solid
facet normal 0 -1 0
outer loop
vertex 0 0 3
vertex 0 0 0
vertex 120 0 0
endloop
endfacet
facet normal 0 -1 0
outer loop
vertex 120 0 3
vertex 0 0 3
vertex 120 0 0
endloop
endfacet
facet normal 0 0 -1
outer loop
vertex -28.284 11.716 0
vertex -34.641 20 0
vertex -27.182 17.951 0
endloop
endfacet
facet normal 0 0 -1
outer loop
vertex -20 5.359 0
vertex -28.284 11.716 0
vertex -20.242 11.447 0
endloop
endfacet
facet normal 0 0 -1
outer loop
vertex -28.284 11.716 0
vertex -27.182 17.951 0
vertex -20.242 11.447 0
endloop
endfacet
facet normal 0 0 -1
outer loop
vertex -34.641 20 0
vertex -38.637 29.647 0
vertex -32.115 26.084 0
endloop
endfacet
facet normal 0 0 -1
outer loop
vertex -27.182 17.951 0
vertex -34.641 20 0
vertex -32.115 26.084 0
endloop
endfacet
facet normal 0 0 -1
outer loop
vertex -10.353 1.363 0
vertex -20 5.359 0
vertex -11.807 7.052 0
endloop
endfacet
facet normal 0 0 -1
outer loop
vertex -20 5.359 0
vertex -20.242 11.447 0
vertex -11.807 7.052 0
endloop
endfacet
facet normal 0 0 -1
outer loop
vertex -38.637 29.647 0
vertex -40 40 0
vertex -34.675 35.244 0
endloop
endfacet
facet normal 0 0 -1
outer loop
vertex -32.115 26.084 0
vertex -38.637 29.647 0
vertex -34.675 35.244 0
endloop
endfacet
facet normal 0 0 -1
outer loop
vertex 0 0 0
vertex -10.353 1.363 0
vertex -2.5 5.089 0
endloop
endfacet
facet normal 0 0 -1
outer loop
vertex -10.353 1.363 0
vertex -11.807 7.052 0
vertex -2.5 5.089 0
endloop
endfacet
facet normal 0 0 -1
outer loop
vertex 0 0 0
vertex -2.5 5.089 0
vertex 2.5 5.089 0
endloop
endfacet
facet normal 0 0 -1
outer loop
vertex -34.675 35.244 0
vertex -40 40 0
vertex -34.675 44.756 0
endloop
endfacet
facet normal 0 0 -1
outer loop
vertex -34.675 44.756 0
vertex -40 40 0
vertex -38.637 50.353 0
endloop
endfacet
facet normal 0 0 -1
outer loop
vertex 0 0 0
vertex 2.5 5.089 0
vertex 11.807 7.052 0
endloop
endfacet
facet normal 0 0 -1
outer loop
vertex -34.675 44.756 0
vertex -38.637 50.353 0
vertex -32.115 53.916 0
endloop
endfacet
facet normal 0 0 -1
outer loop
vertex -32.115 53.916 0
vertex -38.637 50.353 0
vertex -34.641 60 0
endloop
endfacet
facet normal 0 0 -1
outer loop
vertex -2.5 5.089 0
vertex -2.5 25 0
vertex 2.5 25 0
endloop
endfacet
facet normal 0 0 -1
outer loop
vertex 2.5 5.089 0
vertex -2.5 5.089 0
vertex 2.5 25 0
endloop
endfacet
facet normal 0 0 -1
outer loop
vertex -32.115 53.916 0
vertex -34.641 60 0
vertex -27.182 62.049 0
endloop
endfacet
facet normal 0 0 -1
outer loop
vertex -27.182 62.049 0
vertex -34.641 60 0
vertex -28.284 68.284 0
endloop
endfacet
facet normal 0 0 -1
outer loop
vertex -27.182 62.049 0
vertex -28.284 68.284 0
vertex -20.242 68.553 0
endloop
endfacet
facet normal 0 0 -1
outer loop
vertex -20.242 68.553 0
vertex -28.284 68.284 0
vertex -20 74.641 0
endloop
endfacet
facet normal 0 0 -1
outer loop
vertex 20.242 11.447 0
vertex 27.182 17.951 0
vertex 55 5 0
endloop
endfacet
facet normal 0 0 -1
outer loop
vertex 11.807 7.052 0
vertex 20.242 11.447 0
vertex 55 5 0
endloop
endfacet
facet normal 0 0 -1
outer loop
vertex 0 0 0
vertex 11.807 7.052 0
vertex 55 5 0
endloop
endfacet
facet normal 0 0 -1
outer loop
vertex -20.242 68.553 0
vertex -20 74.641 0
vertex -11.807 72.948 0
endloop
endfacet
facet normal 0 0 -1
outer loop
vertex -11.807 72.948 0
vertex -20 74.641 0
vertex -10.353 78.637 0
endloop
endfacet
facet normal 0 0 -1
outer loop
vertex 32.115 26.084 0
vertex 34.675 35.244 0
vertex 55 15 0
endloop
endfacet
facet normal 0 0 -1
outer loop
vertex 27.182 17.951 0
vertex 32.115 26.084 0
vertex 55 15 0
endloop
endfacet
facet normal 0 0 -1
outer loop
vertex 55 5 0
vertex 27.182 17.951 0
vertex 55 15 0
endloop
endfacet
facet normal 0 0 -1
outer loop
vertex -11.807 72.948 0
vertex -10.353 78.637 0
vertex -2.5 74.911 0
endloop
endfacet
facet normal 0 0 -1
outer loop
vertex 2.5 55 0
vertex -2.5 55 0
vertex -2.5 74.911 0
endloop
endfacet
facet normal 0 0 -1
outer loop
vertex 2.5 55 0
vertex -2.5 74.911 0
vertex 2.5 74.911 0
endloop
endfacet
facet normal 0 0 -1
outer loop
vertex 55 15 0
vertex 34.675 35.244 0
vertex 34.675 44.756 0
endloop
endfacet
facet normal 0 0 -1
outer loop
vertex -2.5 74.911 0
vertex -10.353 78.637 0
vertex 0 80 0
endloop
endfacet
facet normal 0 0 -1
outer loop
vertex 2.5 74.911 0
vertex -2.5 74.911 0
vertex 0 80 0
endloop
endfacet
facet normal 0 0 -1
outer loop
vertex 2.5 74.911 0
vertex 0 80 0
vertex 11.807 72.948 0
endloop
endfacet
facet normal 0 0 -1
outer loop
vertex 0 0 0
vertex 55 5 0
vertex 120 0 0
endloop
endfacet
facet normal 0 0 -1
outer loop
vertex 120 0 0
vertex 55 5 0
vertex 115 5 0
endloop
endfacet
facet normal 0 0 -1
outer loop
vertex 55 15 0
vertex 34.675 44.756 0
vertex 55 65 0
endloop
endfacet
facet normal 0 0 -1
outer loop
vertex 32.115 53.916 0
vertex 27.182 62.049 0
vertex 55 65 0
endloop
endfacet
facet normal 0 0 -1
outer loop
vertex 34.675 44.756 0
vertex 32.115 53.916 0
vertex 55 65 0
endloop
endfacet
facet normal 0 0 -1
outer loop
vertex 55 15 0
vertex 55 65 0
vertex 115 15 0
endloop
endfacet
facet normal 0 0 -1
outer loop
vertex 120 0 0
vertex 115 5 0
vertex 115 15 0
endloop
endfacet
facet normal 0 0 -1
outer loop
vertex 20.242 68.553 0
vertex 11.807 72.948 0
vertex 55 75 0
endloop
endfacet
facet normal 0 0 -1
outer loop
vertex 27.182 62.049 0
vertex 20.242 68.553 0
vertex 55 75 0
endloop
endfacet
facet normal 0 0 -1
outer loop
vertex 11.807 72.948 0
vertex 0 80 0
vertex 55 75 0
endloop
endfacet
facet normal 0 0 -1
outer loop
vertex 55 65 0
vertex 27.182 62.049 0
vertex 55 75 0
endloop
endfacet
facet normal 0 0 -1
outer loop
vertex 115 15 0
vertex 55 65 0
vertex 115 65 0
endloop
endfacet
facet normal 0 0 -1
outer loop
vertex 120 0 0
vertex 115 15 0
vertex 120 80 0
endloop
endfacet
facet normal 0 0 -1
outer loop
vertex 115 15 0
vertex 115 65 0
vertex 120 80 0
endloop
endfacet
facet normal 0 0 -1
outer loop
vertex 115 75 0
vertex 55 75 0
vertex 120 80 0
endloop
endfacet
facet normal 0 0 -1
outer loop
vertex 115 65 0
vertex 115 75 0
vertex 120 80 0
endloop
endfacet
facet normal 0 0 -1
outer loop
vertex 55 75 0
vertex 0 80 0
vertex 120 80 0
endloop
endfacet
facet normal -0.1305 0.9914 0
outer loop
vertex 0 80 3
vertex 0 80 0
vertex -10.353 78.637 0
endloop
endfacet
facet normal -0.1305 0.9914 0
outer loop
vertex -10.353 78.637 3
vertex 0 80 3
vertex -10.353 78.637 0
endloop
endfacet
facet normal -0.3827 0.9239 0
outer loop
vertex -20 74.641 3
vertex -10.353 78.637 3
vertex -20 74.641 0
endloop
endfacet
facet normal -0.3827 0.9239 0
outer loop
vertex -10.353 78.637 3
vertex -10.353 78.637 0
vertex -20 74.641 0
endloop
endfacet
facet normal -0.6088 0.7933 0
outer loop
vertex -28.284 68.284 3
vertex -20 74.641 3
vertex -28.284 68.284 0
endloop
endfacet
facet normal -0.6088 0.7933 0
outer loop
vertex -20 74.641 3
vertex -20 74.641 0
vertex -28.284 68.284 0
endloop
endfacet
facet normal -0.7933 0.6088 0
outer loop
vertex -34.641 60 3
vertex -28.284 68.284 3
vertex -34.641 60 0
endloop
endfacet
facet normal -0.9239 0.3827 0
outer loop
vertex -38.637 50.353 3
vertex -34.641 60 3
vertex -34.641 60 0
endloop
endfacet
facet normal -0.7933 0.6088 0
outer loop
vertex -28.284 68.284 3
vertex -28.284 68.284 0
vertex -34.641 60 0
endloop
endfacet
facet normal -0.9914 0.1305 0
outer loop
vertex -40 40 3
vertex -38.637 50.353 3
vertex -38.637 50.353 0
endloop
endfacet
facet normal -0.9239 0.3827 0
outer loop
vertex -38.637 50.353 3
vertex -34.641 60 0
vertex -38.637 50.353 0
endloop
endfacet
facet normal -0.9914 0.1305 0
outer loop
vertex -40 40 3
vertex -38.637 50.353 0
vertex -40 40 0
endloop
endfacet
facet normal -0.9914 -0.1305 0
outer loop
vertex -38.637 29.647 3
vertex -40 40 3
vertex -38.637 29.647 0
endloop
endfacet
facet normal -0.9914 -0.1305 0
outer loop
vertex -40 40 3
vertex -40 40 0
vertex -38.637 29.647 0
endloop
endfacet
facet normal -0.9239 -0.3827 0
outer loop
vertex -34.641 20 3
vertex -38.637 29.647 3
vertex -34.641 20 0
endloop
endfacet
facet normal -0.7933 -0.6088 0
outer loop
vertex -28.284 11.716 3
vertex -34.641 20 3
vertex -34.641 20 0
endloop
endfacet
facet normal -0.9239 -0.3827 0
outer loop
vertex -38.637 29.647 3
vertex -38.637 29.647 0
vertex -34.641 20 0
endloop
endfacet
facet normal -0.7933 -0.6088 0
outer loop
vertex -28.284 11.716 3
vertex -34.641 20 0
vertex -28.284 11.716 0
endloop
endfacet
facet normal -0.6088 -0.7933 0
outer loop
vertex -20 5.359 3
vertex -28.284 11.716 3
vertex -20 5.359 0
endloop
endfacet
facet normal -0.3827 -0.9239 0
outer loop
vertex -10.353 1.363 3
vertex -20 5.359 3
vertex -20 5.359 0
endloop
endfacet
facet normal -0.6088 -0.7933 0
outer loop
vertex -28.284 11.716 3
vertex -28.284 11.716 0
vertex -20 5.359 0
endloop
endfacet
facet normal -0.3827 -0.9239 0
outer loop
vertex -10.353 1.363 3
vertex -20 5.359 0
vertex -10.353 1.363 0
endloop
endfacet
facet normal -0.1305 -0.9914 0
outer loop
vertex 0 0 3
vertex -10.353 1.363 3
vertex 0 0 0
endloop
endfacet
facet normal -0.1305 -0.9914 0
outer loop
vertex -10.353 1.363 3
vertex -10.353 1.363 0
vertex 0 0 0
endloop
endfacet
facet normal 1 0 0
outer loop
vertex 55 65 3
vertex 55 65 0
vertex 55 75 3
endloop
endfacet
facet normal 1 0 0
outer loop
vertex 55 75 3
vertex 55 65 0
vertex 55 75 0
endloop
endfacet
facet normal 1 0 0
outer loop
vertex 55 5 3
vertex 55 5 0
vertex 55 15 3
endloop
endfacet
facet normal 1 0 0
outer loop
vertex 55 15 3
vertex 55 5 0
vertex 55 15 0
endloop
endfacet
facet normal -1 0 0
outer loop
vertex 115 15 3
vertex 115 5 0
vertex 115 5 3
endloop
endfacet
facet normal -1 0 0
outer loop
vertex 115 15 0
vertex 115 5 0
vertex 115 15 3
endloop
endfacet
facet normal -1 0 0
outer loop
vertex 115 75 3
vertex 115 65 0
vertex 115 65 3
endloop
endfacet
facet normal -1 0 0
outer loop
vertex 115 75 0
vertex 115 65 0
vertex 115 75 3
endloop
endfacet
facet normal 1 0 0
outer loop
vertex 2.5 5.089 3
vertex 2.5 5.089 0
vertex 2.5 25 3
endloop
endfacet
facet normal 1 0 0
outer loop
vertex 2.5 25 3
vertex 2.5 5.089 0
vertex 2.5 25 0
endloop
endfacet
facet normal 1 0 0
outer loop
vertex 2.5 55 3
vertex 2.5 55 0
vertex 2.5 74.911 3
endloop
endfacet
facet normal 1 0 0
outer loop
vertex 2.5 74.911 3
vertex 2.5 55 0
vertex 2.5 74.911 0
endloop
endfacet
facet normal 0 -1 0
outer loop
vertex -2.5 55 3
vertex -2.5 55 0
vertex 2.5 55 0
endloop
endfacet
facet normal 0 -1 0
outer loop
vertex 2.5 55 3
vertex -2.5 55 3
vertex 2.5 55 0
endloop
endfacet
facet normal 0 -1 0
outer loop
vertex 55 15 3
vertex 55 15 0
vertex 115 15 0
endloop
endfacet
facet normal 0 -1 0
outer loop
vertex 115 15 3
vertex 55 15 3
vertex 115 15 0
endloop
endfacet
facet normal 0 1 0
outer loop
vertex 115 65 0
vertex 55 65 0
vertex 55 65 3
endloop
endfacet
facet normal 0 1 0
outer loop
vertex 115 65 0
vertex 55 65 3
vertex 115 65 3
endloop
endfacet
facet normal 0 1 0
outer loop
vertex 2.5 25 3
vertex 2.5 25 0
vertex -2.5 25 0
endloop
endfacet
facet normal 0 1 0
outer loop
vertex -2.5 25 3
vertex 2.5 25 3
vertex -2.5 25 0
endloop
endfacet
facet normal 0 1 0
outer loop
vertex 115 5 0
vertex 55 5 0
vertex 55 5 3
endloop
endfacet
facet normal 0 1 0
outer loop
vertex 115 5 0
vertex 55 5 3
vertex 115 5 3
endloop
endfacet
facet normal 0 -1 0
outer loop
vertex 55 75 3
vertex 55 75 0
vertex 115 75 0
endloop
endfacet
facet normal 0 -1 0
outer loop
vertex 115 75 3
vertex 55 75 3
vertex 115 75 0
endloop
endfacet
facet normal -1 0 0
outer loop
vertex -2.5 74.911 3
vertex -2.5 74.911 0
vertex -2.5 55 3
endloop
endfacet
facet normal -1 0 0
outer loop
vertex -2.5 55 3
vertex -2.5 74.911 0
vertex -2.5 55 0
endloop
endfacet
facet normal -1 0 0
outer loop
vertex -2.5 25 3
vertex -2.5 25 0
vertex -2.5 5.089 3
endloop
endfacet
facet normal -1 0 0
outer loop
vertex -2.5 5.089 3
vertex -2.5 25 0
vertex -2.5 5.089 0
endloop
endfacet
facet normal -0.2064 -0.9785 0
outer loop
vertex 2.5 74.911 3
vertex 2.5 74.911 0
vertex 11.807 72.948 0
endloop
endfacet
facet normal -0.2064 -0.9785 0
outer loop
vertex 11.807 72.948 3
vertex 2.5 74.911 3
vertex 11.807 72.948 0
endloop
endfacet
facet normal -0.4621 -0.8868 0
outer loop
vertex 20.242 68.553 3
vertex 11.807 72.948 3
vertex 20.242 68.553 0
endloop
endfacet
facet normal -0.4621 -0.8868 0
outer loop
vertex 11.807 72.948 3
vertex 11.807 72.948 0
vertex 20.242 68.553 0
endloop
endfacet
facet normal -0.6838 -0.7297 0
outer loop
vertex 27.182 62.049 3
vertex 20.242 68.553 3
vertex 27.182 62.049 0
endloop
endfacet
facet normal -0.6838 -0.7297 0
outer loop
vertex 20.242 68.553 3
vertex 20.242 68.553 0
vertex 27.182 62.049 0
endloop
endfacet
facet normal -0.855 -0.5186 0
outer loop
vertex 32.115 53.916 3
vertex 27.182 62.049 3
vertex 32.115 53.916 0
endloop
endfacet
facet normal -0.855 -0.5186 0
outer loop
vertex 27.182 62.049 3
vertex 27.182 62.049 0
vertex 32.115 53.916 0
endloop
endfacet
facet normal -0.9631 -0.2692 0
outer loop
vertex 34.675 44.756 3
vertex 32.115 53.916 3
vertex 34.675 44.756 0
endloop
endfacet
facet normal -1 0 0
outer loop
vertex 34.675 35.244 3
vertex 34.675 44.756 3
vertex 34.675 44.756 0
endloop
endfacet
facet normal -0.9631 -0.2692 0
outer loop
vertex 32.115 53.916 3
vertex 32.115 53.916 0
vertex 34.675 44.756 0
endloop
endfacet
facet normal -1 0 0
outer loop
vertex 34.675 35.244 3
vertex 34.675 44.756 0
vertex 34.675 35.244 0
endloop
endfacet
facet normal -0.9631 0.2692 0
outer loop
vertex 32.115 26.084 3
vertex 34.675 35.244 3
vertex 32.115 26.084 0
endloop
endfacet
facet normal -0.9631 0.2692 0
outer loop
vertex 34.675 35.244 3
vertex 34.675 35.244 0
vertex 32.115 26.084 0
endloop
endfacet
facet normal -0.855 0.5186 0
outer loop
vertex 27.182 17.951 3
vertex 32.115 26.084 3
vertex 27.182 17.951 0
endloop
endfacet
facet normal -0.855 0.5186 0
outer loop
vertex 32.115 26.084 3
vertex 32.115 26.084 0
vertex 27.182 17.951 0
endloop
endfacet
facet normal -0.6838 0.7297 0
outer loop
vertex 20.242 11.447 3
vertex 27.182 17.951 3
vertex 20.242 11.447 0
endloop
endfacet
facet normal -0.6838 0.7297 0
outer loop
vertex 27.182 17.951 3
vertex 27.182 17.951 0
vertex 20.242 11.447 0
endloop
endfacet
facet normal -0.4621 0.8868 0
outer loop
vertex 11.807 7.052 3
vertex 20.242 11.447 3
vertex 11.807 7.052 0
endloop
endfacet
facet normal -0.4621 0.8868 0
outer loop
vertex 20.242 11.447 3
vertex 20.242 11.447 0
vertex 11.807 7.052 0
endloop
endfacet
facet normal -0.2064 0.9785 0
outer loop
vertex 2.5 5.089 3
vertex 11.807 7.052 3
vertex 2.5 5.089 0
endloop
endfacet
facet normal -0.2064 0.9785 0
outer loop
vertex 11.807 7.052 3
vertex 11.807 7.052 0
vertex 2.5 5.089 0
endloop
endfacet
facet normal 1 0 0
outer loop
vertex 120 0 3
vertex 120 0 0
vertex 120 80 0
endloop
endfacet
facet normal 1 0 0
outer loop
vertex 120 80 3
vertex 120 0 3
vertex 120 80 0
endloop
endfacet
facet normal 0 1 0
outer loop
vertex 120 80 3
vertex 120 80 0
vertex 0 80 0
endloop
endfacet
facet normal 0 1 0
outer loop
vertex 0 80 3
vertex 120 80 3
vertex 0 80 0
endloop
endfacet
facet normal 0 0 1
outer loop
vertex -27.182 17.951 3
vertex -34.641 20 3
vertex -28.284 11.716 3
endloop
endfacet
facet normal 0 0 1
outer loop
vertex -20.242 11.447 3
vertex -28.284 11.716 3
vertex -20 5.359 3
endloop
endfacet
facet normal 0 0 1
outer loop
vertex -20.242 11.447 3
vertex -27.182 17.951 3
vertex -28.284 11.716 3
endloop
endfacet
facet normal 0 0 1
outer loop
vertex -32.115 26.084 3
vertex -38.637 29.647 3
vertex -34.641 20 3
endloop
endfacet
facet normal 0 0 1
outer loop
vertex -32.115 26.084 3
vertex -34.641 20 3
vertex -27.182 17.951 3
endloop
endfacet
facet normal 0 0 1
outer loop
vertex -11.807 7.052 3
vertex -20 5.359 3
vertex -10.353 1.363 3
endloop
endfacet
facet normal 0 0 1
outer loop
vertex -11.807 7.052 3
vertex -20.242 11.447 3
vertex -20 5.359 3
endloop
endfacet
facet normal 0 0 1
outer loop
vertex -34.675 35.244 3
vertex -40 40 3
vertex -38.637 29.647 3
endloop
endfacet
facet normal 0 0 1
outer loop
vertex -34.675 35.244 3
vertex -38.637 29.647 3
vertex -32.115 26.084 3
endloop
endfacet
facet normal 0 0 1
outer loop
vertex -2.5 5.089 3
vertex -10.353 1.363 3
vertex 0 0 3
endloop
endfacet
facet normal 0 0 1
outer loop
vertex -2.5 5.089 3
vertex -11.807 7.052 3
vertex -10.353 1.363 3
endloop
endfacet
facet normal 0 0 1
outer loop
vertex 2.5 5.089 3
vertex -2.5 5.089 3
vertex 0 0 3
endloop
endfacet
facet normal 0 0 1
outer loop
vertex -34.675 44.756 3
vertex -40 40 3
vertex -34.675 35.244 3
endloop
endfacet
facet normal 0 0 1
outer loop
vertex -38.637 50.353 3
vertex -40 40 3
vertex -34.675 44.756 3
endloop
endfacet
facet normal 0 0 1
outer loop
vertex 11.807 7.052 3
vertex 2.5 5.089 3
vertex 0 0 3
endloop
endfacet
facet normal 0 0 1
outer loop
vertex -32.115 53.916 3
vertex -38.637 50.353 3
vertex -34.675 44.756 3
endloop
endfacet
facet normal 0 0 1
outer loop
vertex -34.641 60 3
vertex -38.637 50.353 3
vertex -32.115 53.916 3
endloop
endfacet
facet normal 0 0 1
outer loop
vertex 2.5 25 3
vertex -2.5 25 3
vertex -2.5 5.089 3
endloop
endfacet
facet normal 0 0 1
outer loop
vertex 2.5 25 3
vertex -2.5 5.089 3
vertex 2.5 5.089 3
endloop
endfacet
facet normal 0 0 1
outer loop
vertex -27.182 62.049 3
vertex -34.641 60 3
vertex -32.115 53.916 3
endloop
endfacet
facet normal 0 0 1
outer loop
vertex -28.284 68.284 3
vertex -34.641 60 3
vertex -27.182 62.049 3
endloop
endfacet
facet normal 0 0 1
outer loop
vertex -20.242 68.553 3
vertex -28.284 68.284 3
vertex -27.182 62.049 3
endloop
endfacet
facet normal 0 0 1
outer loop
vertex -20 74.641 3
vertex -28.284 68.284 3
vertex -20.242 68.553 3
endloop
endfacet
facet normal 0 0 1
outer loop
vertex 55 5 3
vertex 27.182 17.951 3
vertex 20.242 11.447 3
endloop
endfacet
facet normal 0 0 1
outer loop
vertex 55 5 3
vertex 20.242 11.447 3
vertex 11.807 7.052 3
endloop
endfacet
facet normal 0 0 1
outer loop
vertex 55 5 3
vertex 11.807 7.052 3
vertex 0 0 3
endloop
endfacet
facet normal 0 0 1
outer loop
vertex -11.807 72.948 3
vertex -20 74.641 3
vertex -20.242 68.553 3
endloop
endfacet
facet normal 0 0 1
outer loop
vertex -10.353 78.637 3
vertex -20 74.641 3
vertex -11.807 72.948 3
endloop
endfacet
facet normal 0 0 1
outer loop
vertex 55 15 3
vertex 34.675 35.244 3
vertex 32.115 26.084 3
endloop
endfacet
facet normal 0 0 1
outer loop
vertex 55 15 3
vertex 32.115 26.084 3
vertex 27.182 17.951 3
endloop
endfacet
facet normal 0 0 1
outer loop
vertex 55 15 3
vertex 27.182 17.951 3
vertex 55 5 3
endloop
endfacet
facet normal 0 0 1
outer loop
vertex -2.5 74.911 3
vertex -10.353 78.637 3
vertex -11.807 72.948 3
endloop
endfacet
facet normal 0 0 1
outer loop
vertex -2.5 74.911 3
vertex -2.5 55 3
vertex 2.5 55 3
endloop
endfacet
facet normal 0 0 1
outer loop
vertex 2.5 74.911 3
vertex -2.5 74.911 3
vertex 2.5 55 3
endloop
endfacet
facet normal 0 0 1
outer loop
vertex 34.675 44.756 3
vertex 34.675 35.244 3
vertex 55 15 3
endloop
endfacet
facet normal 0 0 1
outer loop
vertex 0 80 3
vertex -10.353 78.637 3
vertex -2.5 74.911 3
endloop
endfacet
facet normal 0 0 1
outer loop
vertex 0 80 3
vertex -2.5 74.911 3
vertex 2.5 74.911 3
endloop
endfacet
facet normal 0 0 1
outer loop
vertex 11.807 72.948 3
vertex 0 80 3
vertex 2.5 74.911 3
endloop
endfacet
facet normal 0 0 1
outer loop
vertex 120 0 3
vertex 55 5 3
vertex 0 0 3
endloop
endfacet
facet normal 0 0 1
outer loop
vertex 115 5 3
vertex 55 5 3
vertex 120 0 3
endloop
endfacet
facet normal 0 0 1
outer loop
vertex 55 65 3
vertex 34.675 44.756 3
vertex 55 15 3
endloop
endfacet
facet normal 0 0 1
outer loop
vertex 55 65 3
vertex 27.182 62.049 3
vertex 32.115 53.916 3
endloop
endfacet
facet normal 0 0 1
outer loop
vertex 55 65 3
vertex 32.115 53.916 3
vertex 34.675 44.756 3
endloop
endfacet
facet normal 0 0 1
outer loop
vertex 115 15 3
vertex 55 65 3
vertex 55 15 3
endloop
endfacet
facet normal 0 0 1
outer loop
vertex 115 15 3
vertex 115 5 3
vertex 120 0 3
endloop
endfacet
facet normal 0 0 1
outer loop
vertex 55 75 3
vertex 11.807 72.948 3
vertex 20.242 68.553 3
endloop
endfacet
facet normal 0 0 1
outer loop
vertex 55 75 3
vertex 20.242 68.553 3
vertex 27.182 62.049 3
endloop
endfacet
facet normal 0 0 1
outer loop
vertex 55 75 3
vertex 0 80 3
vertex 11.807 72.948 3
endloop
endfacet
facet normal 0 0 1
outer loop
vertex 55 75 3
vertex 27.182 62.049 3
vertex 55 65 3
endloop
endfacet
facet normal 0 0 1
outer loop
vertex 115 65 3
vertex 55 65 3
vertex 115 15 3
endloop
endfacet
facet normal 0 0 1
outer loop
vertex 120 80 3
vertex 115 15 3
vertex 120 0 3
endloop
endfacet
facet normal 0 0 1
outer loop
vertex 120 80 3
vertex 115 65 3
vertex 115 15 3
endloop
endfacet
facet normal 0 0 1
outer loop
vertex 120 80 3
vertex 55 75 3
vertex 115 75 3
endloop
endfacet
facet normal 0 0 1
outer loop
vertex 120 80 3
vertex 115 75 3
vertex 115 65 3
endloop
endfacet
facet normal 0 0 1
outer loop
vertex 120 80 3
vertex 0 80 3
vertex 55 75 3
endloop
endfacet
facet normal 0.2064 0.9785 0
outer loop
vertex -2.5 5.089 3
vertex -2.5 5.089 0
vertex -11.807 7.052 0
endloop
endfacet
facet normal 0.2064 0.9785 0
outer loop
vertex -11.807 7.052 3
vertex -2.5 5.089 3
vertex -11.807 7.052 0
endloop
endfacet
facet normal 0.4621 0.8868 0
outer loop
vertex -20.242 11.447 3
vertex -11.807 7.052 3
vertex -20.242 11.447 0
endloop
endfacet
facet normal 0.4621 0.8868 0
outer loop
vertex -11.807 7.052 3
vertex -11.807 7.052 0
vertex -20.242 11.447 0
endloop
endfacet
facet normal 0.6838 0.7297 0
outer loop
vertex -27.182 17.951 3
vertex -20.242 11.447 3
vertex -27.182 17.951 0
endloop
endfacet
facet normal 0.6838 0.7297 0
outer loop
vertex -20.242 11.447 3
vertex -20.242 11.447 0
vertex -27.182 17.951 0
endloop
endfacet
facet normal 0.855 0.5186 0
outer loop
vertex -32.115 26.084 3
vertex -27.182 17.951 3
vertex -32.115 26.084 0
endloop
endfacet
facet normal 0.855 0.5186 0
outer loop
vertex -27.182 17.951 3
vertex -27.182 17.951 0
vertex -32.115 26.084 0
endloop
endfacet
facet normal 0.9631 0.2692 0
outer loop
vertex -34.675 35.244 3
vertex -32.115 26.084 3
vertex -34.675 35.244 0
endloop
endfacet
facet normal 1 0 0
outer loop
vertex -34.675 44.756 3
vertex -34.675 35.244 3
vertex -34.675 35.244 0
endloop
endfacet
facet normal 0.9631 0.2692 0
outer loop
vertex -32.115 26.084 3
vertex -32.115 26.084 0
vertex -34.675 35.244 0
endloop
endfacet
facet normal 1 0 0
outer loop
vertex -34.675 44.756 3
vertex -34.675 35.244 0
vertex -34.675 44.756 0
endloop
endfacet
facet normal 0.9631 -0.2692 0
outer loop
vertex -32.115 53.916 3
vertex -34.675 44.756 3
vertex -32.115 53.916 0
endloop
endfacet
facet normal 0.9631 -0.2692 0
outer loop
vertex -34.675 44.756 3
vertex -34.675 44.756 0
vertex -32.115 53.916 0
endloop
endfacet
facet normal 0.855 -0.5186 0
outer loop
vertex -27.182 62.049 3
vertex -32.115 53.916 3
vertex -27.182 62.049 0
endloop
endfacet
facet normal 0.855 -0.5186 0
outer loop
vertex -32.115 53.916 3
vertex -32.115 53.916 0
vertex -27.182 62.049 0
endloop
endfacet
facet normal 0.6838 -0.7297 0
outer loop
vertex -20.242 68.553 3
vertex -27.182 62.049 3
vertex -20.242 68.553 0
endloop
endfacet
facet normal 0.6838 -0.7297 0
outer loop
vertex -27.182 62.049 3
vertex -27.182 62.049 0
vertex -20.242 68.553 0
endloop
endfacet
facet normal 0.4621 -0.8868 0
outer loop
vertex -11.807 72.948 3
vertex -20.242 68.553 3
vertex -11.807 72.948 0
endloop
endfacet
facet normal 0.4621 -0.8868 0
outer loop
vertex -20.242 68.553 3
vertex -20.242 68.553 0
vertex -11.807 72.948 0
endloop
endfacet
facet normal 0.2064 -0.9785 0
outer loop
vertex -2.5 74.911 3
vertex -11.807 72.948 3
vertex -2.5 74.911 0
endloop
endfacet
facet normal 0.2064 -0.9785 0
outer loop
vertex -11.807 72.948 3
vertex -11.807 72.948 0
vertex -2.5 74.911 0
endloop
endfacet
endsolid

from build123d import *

# Parameters (mm, degrees)
SKETCH1_W           = 60
SKETCH1_H           = 10
BOSS_EXTRUDE1_DEPTH = 3


with BuildPart() as part:
    # Sketch1 → Boss-Extrude1 (new body)
    with BuildSketch(Plane.XY):
        with BuildLine():
            Line((0, 0), (120, 0))
            Line((120, 0), (120, 80))
            Line((120, 80), (0, 80))
            ThreePointArc((0, 80), (-40, 40), (0, 0))
        make_face()
        with Locations((85, 70)):
            Rectangle(SKETCH1_W, SKETCH1_H, mode=Mode.SUBTRACT)
        with Locations((85, 10)):
            Rectangle(SKETCH1_W, SKETCH1_H, mode=Mode.SUBTRACT)
        with BuildLine():
            Line((2.5, 55), (2.5, 74.910600109))
            ThreePointArc((2.5, 74.910600109), (35, 40), (2.5, 5.089399891))
            Line((2.5, 5.089399891), (2.5, 25))
            Line((2.5, 25), (-2.5, 25))
            Line((-2.5, 25), (-2.5, 5.089399891))
            ThreePointArc((-2.5, 5.089399891), (-35, 40), (-2.5, 74.910600109))
            Line((-2.5, 74.910600109), (-2.5, 55))
            Line((-2.5, 55), (2.5, 55))
        make_face(mode=Mode.SUBTRACT)
    extrude(amount=BOSS_EXTRUDE1_DEPTH)


solid = part.part
